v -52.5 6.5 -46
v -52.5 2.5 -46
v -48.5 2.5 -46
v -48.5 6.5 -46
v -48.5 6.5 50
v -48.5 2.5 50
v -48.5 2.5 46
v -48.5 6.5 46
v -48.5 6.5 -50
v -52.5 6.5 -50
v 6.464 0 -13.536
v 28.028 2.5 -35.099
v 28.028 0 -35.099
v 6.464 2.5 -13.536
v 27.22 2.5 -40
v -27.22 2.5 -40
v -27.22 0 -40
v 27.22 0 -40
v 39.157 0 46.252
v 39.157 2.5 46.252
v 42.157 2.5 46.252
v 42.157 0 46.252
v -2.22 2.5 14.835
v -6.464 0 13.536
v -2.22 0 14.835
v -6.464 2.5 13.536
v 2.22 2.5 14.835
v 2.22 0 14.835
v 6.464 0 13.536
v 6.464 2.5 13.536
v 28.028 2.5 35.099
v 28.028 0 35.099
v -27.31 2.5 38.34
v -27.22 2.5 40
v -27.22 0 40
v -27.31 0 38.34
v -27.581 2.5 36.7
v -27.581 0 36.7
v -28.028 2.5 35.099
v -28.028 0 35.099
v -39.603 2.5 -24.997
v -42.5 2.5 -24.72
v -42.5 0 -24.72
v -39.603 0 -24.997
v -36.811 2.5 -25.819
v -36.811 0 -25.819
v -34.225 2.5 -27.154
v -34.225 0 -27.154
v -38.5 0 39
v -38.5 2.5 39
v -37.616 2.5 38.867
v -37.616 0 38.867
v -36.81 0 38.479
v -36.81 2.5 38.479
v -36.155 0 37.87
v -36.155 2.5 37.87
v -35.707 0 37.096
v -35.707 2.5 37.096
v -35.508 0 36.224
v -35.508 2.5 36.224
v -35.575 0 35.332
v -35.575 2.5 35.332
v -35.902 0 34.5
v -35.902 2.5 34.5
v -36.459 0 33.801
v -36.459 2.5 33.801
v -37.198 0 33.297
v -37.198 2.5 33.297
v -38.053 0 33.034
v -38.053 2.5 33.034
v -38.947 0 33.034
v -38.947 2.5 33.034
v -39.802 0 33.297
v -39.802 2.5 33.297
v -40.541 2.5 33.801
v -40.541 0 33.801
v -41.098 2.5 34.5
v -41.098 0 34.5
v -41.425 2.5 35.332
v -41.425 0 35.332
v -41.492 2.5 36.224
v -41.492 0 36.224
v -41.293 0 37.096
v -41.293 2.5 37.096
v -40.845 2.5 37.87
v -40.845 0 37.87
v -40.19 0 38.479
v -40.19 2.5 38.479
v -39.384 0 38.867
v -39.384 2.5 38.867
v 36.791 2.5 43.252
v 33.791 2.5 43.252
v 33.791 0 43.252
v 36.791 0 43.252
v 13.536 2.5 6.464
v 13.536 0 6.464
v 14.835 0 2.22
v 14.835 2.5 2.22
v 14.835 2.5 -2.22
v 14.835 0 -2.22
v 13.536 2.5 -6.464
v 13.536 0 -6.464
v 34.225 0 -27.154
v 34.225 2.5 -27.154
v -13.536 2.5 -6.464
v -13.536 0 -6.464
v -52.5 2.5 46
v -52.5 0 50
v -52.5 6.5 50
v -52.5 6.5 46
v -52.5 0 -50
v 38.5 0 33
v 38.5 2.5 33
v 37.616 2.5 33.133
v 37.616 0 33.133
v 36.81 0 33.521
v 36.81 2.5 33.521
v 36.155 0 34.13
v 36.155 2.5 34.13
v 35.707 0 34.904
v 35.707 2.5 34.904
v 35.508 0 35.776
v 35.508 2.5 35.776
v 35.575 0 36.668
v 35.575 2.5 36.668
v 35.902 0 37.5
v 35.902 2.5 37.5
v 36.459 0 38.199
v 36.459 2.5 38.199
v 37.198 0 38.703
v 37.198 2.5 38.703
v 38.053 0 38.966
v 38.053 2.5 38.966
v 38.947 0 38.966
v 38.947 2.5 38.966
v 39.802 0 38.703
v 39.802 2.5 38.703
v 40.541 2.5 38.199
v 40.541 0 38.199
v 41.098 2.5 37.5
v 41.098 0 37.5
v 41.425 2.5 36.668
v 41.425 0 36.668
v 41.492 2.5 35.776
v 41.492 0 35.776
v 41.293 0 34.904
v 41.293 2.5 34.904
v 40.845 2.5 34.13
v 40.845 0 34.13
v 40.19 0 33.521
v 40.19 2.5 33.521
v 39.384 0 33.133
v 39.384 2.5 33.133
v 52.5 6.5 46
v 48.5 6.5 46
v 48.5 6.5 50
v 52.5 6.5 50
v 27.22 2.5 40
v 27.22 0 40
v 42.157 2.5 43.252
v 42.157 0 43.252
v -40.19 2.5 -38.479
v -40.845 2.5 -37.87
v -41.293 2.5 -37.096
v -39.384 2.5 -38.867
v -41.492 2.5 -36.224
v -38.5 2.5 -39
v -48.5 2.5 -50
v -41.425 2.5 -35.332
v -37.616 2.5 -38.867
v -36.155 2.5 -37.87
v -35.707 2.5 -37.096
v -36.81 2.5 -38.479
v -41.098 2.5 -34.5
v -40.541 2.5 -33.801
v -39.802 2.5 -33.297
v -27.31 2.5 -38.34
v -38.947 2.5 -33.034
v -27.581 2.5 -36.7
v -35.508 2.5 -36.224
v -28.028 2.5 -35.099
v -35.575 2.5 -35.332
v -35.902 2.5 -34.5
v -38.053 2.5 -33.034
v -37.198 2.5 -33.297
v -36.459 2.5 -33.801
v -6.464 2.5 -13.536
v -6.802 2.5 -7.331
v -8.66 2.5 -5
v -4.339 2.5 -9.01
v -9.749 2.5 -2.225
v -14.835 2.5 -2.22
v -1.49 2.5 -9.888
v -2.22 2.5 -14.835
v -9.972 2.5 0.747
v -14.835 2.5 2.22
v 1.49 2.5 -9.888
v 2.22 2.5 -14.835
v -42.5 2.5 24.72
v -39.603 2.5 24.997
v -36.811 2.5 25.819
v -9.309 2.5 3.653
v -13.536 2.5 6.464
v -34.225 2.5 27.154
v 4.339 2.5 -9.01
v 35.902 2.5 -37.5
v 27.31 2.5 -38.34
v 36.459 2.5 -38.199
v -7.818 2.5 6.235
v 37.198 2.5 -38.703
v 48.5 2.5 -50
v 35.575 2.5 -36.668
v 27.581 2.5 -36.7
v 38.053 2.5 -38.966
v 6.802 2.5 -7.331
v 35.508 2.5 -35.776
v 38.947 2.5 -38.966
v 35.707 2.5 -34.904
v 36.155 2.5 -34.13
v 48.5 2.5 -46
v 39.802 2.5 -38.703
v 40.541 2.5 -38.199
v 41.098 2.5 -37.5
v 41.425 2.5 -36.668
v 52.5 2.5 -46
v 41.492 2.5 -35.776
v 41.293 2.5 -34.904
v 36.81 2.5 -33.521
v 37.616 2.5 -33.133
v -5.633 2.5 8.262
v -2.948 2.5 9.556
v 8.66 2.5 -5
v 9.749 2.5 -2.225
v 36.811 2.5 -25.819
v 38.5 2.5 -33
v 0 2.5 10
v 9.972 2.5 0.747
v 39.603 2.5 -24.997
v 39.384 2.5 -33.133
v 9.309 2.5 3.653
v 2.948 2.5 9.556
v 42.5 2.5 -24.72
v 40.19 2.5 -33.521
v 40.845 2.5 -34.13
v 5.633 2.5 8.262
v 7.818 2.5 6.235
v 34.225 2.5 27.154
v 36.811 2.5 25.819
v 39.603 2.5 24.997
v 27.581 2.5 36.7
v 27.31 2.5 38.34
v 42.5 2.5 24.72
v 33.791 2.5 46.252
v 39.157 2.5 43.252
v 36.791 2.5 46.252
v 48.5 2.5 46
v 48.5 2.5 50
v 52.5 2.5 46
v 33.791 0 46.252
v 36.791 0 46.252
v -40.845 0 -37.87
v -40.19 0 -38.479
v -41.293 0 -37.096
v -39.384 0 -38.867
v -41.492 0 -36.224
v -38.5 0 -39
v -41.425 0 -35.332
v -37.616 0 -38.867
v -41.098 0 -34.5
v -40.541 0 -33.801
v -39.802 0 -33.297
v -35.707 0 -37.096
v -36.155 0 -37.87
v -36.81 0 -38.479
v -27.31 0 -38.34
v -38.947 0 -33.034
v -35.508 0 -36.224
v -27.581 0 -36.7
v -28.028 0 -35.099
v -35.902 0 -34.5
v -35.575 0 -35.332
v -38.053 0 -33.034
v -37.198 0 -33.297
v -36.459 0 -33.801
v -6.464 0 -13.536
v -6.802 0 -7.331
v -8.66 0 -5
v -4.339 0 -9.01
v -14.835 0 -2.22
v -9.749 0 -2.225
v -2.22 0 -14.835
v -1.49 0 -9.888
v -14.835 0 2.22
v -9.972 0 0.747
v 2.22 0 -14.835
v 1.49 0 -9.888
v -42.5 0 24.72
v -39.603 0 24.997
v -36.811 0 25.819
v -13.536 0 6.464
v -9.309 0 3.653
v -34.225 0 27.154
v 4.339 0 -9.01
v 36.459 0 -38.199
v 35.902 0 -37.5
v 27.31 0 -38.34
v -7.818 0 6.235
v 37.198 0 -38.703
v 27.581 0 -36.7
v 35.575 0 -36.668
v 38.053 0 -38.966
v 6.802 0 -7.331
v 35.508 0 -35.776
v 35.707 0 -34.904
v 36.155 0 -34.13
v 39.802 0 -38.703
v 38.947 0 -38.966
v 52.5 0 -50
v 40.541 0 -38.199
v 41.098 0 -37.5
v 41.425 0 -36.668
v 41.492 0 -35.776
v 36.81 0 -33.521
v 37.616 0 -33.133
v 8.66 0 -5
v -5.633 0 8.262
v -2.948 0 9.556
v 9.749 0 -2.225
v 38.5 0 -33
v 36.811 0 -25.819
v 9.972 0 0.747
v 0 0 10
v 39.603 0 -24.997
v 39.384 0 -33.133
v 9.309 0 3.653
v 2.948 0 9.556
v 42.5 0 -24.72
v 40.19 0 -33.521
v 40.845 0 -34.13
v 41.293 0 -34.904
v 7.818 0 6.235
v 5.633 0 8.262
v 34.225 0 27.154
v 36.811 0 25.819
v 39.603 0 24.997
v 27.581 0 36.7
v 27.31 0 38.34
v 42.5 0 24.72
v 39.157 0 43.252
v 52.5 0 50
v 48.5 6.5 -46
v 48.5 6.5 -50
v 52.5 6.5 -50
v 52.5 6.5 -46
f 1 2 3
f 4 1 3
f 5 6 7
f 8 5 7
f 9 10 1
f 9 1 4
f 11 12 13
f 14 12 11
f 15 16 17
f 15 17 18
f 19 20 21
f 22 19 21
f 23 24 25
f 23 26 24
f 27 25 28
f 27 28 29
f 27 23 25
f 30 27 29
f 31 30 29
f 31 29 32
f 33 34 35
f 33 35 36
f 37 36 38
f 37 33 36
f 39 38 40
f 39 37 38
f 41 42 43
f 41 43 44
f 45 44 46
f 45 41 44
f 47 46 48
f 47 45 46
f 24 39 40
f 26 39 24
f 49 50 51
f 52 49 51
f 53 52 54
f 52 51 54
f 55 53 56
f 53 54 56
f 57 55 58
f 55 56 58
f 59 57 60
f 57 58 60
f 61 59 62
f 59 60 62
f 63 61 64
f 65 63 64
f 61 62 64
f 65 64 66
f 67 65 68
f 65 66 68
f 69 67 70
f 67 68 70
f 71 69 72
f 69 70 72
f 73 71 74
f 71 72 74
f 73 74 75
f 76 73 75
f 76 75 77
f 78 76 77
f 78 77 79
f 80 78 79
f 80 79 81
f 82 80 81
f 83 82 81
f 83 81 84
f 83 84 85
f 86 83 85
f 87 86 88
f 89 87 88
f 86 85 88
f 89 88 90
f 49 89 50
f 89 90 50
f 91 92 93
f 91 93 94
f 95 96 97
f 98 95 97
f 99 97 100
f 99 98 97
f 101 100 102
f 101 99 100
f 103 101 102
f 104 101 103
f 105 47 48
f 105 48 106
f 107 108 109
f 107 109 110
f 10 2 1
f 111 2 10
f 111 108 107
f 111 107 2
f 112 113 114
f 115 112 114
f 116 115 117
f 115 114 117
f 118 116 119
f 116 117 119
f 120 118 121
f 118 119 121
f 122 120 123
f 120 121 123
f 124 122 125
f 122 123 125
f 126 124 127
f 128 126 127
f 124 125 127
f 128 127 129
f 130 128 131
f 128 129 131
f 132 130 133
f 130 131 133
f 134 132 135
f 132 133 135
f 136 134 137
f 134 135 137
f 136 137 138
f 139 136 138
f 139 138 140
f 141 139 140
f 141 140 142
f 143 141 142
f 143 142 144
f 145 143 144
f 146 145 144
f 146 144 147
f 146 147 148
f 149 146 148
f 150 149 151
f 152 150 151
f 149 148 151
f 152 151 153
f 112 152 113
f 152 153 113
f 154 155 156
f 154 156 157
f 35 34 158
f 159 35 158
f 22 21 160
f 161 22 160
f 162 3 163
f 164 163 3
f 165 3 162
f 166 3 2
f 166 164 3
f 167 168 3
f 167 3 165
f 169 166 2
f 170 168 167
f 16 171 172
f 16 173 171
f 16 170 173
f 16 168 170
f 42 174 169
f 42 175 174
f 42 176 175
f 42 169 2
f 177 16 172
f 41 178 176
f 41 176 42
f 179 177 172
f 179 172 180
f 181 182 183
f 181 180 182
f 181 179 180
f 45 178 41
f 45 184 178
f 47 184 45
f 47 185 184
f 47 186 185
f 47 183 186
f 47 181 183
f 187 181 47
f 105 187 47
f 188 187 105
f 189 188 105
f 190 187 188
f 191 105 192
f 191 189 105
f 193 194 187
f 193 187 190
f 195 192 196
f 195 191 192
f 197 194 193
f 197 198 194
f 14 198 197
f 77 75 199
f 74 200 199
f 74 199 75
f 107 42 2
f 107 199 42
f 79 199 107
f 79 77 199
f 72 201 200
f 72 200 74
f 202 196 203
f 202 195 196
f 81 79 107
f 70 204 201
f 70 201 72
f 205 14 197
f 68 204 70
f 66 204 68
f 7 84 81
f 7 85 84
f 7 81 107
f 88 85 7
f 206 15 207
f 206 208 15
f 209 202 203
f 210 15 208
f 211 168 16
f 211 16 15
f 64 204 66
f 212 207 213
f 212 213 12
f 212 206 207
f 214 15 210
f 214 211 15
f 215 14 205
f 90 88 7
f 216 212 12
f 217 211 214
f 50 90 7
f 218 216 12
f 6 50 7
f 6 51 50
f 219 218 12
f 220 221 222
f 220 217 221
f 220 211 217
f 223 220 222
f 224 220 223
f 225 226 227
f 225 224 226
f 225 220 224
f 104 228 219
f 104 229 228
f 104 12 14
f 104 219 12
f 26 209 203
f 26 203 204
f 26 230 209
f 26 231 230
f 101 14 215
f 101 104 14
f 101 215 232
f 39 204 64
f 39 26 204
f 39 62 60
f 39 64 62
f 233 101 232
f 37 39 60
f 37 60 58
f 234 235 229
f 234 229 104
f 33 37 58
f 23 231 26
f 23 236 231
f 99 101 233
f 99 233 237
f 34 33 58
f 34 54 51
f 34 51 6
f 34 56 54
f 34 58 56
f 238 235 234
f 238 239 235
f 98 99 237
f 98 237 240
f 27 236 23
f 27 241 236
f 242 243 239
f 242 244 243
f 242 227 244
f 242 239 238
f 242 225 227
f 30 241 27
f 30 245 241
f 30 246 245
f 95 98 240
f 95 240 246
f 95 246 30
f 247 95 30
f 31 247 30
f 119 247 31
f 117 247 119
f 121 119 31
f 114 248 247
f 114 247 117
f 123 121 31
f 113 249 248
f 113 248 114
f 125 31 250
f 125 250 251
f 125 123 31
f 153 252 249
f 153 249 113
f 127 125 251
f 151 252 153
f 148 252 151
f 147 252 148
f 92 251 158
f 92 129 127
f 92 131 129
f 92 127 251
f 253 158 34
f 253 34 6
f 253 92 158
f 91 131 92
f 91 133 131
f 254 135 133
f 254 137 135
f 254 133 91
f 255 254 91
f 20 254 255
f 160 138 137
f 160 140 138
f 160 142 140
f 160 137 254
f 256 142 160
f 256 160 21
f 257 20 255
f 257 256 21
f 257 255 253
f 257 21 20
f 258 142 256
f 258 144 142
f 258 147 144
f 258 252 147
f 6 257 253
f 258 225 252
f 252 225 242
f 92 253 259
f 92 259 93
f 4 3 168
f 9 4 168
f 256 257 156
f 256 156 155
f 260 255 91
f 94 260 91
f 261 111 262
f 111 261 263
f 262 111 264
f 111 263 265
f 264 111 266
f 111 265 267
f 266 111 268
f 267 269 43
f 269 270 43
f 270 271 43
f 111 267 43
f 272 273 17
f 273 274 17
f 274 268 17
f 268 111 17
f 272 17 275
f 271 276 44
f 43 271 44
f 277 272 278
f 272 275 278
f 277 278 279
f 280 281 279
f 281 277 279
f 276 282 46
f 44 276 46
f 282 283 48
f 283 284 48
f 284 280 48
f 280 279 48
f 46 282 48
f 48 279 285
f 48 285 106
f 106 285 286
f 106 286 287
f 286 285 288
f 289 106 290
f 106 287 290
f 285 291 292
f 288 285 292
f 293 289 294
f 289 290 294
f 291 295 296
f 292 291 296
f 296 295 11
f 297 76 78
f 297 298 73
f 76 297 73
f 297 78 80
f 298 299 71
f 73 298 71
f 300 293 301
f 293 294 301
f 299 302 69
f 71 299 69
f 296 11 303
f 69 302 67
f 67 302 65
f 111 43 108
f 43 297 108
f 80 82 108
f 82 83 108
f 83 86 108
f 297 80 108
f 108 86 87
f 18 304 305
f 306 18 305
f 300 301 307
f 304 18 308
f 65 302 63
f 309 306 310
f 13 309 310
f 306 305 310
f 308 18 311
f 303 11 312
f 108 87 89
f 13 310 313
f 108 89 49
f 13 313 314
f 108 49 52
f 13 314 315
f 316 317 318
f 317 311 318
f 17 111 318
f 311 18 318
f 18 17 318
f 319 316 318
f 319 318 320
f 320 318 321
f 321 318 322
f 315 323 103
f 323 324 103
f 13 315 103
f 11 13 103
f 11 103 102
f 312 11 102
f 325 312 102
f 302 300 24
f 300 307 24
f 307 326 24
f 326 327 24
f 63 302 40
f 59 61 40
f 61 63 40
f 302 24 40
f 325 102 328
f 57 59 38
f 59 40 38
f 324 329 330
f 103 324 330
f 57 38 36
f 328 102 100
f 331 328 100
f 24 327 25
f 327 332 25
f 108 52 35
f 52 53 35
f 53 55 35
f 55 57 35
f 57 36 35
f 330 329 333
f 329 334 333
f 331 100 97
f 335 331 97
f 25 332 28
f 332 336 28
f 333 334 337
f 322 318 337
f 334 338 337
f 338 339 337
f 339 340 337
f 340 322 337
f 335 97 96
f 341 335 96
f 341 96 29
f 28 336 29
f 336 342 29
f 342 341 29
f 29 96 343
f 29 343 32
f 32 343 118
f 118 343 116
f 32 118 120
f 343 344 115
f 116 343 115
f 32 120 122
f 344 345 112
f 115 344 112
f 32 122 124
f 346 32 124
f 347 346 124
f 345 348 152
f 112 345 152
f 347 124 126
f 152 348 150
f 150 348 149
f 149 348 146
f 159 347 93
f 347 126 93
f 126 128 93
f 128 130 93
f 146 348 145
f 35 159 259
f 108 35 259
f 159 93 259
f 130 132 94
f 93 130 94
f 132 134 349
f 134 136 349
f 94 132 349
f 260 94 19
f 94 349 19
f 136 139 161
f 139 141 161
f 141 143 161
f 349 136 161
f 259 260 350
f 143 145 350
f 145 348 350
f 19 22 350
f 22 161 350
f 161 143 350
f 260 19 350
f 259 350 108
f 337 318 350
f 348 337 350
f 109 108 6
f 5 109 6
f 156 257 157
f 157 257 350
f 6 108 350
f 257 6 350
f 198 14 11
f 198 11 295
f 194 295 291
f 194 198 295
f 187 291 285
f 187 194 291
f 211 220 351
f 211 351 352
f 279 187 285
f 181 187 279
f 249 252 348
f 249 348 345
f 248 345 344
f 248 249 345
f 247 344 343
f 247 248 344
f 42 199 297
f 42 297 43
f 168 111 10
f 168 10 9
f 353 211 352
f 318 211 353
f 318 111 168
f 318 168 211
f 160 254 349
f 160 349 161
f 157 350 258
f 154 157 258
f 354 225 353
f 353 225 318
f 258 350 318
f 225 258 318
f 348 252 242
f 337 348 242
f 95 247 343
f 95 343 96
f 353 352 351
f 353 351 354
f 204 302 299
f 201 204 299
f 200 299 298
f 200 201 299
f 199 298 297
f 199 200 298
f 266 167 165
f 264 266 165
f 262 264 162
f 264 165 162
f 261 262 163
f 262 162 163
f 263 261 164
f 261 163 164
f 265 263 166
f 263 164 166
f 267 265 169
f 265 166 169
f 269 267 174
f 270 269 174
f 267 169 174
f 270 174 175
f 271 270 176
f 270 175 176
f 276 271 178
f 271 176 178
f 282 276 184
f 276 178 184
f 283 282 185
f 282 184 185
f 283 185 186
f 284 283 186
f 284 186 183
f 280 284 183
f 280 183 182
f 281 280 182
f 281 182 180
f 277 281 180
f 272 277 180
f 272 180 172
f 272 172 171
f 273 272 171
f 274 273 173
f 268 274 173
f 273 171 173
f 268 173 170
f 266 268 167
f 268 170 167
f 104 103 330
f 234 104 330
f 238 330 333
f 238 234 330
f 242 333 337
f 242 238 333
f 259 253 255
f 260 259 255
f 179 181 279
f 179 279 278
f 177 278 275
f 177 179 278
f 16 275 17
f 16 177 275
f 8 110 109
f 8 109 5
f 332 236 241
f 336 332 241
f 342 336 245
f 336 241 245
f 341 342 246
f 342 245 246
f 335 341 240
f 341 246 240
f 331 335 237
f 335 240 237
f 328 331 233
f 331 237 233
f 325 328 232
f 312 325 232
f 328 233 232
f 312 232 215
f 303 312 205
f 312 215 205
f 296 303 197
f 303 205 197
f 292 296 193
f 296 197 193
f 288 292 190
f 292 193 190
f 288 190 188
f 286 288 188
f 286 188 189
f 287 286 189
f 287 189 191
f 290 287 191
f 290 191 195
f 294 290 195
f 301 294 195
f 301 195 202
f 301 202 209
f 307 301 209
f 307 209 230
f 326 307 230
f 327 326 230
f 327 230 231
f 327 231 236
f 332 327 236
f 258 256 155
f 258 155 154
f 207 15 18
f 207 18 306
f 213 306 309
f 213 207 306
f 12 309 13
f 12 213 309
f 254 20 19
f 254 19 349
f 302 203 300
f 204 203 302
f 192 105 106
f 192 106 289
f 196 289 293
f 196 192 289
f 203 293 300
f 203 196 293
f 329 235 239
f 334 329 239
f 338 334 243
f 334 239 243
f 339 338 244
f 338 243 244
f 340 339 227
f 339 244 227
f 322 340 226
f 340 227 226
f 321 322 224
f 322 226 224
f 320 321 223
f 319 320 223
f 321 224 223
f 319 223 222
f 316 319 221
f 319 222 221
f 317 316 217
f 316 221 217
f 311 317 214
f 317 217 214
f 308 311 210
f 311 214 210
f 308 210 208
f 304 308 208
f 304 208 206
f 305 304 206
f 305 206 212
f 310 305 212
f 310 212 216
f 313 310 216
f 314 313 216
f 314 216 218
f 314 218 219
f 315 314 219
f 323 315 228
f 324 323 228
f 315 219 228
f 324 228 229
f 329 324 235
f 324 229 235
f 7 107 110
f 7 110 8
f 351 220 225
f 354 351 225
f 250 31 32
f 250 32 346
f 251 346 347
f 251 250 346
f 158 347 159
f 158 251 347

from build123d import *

# Parameters (mm, degrees)
SKETCH1_W           = 105
SKETCH1_H           = 100
BOSS_EXTRUDE1_DEPTH = 2.5
SKETCH3_W           = 4
SKETCH3_H           = 4
BOSS_EXTRUDE2_DEPTH = 4
SKETCH5_W           = 85
SKETCH5_H           = 80
CUT_EXTRUDE2_DEPTH  = 4
SKETCH6_R           = 15
BOSS_EXTRUDE3_DEPTH = 2.5
SKETCH7_W           = 5
SKETCH7_H           = 5
CUT_EXTRUDE3_DEPTH  = 2.5
BOSS_EXTRUDE4_DEPTH = 2.5
EXTRUDE_THIN2_DEPTH = 2.5
SKETCH10_R          = 3
CUT_EXTRUDE5_DEPTH  = 2.5
SKETCH11_W          = 3
SKETCH11_H          = 3
CUT_EXTRUDE6_DEPTH  = 2.5
SKETCH12_R          = 10
CUT_EXTRUDE7_DEPTH  = 10


with BuildPart() as part:
    # Sketch1 → Boss-Extrude1 (new body)
    with BuildSketch(Plane(origin=(0, 0, 0), x_dir=(1, 0, 0), z_dir=(0, 1, 0))):
        Rectangle(SKETCH1_W, SKETCH1_H)
    extrude(amount=BOSS_EXTRUDE1_DEPTH)

    # Sketch3 → Boss-Extrude2 (add)
    with BuildSketch(Plane(origin=(0, 2.5, 0), x_dir=(1, 0, 0), z_dir=(0, 1, 0))):
        with Locations((-50.5, 48)):
            Rectangle(SKETCH3_W, SKETCH3_H)
        with Locations((50.5, 48)):
            Rectangle(SKETCH3_W, SKETCH3_H)
        with Locations((50.5, -48)):
            Rectangle(SKETCH3_W, SKETCH3_H)
        with Locations((-50.5, -48)):
            Rectangle(SKETCH3_W, SKETCH3_H)
    extrude(amount=BOSS_EXTRUDE2_DEPTH)

    # Sketch5 → Cut-Extrude2 (cut)
    with BuildSketch(Plane(origin=(0, 2.5, 0), x_dir=(1, 0, 0), z_dir=(0, 1, 0))):
        Rectangle(SKETCH5_W, SKETCH5_H)
    extrude(amount=-CUT_EXTRUDE2_DEPTH, mode=Mode.SUBTRACT)

    # Sketch8 → Boss-Extrude4 (add)
    with BuildSketch(Plane(origin=(0, 2.5, 0), x_dir=(1, 0, 0), z_dir=(0, 1, 0))):
        with BuildLine():
            Line((-42.5, -40), (-27.220069463, -40))
            ThreePointArc((-27.220069463, -40), (-31.695457502, -29.195457502), (-42.5, -24.720069463))
            Line((-42.5, -24.720069463), (-42.5, -40))
        make_face()
        with BuildLine():
            ThreePointArc((-42.5, 24.720069463), (-31.695457502, 29.195457502), (-27.220069463, 40))
            Line((-27.220069463, 40), (-42.5, 40))
            Line((-42.5, 40), (-42.5, 24.720069463))
        make_face()
        with BuildLine():
            Line((42.5, 40), (27.220069463, 40))
            ThreePointArc((27.220069463, 40), (31.695457502, 29.195457502), (42.5, 24.720069463))
            Line((42.5, 24.720069463), (42.5, 40))
        make_face()
        with BuildLine():
            ThreePointArc((42.5, -24.720069463), (31.695457502, -29.195457502), (27.220069463, -40))
            Line((27.220069463, -40), (42.5, -40))
            Line((42.5, -40), (42.5, -24.720069463))
        make_face()
    extrude(amount=-BOSS_EXTRUDE4_DEPTH)



with BuildPart() as body_2:
    # Sketch6 → Boss-Extrude3 (new body)
    with BuildSketch(Plane(origin=(0, 2.5, 0), x_dir=(1, 0, 0), z_dir=(0, 1, 0))):
        with Locations(Location((0, 0, 0), (0, 0, 270))):
            Circle(SKETCH6_R)
    extrude(amount=-BOSS_EXTRUDE3_DEPTH)

    # Sketch7 → Cut-Extrude3 (cut)
    with BuildSketch(Plane(origin=(0, 2.5, 0), x_dir=(1, 0, 0), z_dir=(0, 1, 0))):
        Rectangle(SKETCH7_W, SKETCH7_H)
    extrude(amount=-CUT_EXTRUDE3_DEPTH, mode=Mode.SUBTRACT)


with BuildPart() as part_1:
    add(part.part)

    add(body_2.part)  # Extrude-Thin2 merges body 2
    # Sketch9 → Extrude-Thin2 (add)
    with BuildSketch(Plane(origin=(0, 2.5, 0), x_dir=(1, 0, 0), z_dir=(0, 1, 0))):
        Polygon((-1.035533906, -6.035533906), (34.46870341, -41.539771222), (41.539771222, -34.46870341), (6.035533906, 1.035533906), align=None)
        Polygon((-11.285533906, -4.214466094), (-41.539771222, -34.46870341), (-34.46870341, -41.539771222), (-4.214466094, -11.285533906), align=None)
        Polygon((11.285533906, 4.214466094), (41.539771222, 34.46870341), (34.46870341, 41.539771222), (4.214466094, 11.285533906), align=None)
        Polygon((-4.214466094, 11.285533906), (-34.46870341, 41.539771222), (-41.539771222, 34.46870341), (-11.285533906, 4.214466094), align=None)
    extrude(amount=-EXTRUDE_THIN2_DEPTH)

    # Sketch10 → Cut-Extrude5 (cut)
    with BuildSketch(Plane(origin=(0, 2.5, 0), x_dir=(1, 0, 0), z_dir=(0, 1, 0))):
        with Locations(Location((38.5, 36, 0), (0, 0, 270))):
            Circle(SKETCH10_R)
        with Locations(Location((-38.5, 36, 0), (0, 0, 90))):
            Circle(SKETCH10_R)
        with Locations(Location((38.5, -36, 0), (0, 0, 90))):
            Circle(SKETCH10_R)
        with Locations(Location((-38.5, -36, 0), (0, 0, 270))):
            Circle(SKETCH10_R)
    extrude(amount=-CUT_EXTRUDE5_DEPTH, mode=Mode.SUBTRACT)

    # Sketch11 → Cut-Extrude6 (cut)
    with BuildSketch(Plane(origin=(0, 2.5, 0), x_dir=(1, 0, 0), z_dir=(0, 1, 0))):
        with Locations((40.657260224, -44.752137111)):
            Rectangle(SKETCH11_W, SKETCH11_H)
        with Locations((35.291405318, -44.752137111)):
            Rectangle(SKETCH11_W, SKETCH11_H)
    extrude(amount=-CUT_EXTRUDE6_DEPTH, mode=Mode.SUBTRACT)

    # Sketch12 → Cut-Extrude7 (cut)
    with BuildSketch(Plane(origin=(0, 2.5, 0), x_dir=(1, 0, 0), z_dir=(0, 1, 0))):
        with Locations(Location((0, 0, 0), (0, 0, 270))):
            Circle(SKETCH12_R)
    extrude(amount=-CUT_EXTRUDE7_DEPTH, mode=Mode.SUBTRACT)


solid = part_1.part
